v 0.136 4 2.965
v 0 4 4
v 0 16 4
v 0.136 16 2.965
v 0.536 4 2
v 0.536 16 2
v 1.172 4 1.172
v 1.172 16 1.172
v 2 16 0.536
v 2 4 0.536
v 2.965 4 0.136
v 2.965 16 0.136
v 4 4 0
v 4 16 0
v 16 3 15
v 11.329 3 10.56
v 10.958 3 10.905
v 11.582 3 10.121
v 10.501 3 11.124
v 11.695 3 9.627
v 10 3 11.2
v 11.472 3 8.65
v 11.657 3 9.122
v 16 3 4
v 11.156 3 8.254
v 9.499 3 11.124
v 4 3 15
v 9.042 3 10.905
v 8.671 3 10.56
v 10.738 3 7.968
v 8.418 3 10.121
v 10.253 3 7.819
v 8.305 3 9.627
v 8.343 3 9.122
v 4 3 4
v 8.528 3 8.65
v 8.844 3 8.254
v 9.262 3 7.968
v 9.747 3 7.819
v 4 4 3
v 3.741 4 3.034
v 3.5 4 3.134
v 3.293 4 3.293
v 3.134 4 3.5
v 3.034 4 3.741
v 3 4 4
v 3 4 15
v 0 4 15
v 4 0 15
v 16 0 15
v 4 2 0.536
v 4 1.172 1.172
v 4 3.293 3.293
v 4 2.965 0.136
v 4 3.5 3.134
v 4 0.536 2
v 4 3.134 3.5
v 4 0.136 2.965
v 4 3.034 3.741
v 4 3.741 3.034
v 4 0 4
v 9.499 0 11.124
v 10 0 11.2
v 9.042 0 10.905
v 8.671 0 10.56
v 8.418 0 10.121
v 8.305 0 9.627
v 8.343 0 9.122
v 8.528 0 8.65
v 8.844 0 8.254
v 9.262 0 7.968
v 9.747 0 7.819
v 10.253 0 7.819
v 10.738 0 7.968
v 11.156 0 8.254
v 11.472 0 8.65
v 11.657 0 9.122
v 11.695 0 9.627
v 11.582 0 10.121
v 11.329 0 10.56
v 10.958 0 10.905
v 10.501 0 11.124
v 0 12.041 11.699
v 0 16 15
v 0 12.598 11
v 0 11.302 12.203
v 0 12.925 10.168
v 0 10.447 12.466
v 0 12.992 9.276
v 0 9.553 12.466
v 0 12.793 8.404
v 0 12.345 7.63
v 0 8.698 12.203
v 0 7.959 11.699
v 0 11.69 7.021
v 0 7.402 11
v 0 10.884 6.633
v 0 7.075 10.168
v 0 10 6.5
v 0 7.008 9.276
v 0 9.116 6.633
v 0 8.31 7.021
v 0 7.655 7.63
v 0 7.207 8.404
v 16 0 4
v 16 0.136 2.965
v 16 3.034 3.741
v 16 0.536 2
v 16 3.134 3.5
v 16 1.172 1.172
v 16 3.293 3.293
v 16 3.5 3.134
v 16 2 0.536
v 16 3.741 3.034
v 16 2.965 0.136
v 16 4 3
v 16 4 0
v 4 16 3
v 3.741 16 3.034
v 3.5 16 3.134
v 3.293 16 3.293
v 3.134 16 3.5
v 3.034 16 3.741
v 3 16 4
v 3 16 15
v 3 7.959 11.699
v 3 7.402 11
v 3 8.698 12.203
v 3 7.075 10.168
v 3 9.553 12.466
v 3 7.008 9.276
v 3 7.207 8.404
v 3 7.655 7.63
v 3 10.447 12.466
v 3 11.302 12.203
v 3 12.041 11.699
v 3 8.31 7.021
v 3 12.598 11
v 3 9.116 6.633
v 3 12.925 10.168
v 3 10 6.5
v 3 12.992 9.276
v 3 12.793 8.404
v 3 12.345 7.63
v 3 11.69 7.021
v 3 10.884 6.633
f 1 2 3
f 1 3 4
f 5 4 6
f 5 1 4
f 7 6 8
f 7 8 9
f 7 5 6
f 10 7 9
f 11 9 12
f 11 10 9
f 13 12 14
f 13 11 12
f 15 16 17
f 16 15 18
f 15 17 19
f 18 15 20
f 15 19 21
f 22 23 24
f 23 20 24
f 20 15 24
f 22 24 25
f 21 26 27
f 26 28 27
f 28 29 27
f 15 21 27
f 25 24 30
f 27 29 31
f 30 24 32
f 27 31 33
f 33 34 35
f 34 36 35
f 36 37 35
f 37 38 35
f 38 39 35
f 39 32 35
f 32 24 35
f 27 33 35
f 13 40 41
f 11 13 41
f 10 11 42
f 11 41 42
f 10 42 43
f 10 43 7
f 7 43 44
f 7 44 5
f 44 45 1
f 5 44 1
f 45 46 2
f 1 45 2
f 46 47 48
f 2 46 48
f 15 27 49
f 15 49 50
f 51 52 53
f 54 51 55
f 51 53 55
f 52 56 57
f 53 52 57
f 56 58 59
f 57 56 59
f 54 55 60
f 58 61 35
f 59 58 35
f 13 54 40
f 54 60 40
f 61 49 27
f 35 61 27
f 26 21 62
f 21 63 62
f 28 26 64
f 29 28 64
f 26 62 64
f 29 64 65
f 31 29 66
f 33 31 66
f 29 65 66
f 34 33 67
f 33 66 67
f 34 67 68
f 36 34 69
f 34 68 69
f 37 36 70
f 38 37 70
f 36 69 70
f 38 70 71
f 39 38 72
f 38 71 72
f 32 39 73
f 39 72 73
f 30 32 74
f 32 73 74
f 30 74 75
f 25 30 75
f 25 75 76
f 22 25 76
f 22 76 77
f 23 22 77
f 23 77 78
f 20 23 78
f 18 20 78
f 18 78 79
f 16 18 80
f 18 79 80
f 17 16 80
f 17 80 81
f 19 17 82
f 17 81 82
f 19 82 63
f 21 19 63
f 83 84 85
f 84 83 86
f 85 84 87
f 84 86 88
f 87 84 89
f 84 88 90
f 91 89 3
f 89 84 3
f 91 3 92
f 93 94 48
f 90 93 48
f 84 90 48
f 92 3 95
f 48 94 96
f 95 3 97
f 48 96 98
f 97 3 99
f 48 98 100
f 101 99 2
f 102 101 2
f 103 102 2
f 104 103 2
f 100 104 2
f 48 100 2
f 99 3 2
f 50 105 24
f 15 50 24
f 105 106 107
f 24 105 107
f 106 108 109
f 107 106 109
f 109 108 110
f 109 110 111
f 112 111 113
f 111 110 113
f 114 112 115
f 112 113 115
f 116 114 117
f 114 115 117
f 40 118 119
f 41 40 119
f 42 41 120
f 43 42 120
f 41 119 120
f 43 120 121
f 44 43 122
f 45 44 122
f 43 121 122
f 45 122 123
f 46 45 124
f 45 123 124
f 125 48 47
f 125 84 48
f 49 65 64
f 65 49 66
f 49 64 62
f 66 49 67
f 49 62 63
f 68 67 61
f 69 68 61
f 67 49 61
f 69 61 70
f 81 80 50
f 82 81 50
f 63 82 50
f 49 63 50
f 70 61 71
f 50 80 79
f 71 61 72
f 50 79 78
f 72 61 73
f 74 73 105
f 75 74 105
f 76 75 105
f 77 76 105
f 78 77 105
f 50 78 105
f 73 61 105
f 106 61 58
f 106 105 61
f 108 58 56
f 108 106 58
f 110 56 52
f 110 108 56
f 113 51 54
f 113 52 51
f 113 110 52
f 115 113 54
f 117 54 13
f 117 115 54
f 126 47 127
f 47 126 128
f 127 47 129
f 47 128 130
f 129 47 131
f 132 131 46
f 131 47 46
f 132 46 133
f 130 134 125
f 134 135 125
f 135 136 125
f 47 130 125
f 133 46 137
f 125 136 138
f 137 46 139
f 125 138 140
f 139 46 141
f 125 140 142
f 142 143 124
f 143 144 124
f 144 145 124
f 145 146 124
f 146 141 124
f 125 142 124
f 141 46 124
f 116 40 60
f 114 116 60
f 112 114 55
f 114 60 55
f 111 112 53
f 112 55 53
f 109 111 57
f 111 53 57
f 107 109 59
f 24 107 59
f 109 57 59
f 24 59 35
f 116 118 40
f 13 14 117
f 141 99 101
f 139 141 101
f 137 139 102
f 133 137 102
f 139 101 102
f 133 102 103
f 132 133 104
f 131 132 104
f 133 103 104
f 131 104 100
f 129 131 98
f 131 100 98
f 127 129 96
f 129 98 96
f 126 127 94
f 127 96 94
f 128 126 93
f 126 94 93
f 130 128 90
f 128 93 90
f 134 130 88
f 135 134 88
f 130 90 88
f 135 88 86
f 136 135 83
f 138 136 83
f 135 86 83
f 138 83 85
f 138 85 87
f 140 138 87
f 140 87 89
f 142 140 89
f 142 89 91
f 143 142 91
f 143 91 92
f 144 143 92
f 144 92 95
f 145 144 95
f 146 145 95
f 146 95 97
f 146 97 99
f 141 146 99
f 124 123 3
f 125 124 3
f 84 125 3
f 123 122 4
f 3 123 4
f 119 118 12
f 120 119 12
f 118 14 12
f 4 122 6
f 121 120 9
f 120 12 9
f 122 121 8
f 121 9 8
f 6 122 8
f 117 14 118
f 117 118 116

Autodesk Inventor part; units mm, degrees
ref_plane "YZ Plane" through (0, 0, 0) normal (1, 0, 0) x (0, 1, 0)
ref_plane "XZ Plane" through (0, 0, 0) normal (0, 1, 0) x (-1, 0, 0)
ref_plane "XY Plane" through (0, 0, 0) normal (0, 0, 1) x (1, 0, 0)
sketch "Sketch1" plane through (0, 0, 0) normal (0, 0, 1) x (1, 0, 0)
  line L0 (0, 0) -> (16, 0)
  line L1 (16, 0) -> (16, 16)
  line L2 (16, 16) -> (0, 16)
  line L3 (0, 16) -> (0, 0)
  line L4 (4, 16) -> (16, 4)
  dimension "d0" = 45
  dimension "d1" = 16
  dimension "d2" = 16
  dimension "d3" = 4
extrude "Extrusion1" add sketch "Sketch1" along normal blind 3 contours L3 L2 L4 L1 L0
sketch "Sketch2" plane through (0, 0, 3) normal (0, 0, 1) x (1, 0, 0)
  line L0 (0, 0) -> (16, 0) projected
  line L1 (16, 0) -> (16, 4) projected
  line L2 (16, 4) -> (4, 16) projected
  line L3 (4, 16) -> (0, 16) projected
  line L4 (0, 16) -> (0, 0) projected
  line L5 (4, 16) -> (0, 16) projected
  line L6 (0, 0) -> (3, 0)
  line L7 (3, 0) -> (3, 16)
  line L8 (3, 16) -> (0, 16)
  line L9 (0, 16) -> (0, 0)
  line L10 (16, 3) -> (0, 3)
  line L11 (0, 3) -> (0, 0)
  line L12 (0, 0) -> (16, 0)
  line L13 (16, 0) -> (16, 3)
  dimension "d20" = 3
  dimension "d21" = 3
extrude "Extrusion2" add sketch "Sketch2" along normal blind 12 contours L4 L10 L7 L0 | L7 L10 L1 L0 | L4 L3 L7 L10
sketch "Sketch6" plane through (0, 0, 15) normal (0, 0, 1) x (1, 0, 0)
  line L0 (0, 0) -> (4, 0)
  line L1 (4, 0) -> (4, 4)
  line L2 (4, 4) -> (0, 4)
  line L3 (0, 4) -> (0, 0)
  line L4 (3, 3) -> (3, 16) projected
  line L5 (16, 3) -> (3, 3) projected
  dimension "d22" = 1
  dimension "d23" = 1
extrude "Extrusion5" cut sketch "Sketch6" against normal through all
fillet "Fillet1" radius 1 2 edges at (3, 10, 3) (10, 3, 3)
fillet "Fillet2" radius 4 2 edges at (0, 10, 0) (10, 0, 0)
sketch "Sketch7" plane through (3, 4, 15) normal (1, 0, 0) x (0, 0, -1)
  line L0 (0, 0) -> (0, 12) projected
  line L1 (11, 12) -> (0, 12) projected
  point P0 (15, -4)
  point P1 (5.5, 6)
  point P2 (0, 6)
  point P3 (5.5, 12)
hole "Hole1" at (3, 10, 9.5) direction (-1, 0, 0) diameter 6 end through all
sketch "Sketch8" plane through (4, 3, 15) normal (0, 1, 0) x (1, 0, 0)
  line L0 (0, 11) -> (0, 0) projected
  line L1 (12, 0) -> (0, 0) projected
  point P0 (-4, 15)
  point P1 (6, 5.5)
  point P2 (0, 5.5)
  point P3 (6, 0)
hole "Hole2" at (10, 3, 9.5) direction (0, -1, 0) diameter 3.4 end through all clearance for "Flat Head Machine Screw" size "M3" standard "Ansi Metric M Profile"
equation "\"d2\" = d1"
equation "\"d21\" = d20"
equation "\"d23\" = d22"
properties part number "Top_Cable End" material "Aluminum 6061"
